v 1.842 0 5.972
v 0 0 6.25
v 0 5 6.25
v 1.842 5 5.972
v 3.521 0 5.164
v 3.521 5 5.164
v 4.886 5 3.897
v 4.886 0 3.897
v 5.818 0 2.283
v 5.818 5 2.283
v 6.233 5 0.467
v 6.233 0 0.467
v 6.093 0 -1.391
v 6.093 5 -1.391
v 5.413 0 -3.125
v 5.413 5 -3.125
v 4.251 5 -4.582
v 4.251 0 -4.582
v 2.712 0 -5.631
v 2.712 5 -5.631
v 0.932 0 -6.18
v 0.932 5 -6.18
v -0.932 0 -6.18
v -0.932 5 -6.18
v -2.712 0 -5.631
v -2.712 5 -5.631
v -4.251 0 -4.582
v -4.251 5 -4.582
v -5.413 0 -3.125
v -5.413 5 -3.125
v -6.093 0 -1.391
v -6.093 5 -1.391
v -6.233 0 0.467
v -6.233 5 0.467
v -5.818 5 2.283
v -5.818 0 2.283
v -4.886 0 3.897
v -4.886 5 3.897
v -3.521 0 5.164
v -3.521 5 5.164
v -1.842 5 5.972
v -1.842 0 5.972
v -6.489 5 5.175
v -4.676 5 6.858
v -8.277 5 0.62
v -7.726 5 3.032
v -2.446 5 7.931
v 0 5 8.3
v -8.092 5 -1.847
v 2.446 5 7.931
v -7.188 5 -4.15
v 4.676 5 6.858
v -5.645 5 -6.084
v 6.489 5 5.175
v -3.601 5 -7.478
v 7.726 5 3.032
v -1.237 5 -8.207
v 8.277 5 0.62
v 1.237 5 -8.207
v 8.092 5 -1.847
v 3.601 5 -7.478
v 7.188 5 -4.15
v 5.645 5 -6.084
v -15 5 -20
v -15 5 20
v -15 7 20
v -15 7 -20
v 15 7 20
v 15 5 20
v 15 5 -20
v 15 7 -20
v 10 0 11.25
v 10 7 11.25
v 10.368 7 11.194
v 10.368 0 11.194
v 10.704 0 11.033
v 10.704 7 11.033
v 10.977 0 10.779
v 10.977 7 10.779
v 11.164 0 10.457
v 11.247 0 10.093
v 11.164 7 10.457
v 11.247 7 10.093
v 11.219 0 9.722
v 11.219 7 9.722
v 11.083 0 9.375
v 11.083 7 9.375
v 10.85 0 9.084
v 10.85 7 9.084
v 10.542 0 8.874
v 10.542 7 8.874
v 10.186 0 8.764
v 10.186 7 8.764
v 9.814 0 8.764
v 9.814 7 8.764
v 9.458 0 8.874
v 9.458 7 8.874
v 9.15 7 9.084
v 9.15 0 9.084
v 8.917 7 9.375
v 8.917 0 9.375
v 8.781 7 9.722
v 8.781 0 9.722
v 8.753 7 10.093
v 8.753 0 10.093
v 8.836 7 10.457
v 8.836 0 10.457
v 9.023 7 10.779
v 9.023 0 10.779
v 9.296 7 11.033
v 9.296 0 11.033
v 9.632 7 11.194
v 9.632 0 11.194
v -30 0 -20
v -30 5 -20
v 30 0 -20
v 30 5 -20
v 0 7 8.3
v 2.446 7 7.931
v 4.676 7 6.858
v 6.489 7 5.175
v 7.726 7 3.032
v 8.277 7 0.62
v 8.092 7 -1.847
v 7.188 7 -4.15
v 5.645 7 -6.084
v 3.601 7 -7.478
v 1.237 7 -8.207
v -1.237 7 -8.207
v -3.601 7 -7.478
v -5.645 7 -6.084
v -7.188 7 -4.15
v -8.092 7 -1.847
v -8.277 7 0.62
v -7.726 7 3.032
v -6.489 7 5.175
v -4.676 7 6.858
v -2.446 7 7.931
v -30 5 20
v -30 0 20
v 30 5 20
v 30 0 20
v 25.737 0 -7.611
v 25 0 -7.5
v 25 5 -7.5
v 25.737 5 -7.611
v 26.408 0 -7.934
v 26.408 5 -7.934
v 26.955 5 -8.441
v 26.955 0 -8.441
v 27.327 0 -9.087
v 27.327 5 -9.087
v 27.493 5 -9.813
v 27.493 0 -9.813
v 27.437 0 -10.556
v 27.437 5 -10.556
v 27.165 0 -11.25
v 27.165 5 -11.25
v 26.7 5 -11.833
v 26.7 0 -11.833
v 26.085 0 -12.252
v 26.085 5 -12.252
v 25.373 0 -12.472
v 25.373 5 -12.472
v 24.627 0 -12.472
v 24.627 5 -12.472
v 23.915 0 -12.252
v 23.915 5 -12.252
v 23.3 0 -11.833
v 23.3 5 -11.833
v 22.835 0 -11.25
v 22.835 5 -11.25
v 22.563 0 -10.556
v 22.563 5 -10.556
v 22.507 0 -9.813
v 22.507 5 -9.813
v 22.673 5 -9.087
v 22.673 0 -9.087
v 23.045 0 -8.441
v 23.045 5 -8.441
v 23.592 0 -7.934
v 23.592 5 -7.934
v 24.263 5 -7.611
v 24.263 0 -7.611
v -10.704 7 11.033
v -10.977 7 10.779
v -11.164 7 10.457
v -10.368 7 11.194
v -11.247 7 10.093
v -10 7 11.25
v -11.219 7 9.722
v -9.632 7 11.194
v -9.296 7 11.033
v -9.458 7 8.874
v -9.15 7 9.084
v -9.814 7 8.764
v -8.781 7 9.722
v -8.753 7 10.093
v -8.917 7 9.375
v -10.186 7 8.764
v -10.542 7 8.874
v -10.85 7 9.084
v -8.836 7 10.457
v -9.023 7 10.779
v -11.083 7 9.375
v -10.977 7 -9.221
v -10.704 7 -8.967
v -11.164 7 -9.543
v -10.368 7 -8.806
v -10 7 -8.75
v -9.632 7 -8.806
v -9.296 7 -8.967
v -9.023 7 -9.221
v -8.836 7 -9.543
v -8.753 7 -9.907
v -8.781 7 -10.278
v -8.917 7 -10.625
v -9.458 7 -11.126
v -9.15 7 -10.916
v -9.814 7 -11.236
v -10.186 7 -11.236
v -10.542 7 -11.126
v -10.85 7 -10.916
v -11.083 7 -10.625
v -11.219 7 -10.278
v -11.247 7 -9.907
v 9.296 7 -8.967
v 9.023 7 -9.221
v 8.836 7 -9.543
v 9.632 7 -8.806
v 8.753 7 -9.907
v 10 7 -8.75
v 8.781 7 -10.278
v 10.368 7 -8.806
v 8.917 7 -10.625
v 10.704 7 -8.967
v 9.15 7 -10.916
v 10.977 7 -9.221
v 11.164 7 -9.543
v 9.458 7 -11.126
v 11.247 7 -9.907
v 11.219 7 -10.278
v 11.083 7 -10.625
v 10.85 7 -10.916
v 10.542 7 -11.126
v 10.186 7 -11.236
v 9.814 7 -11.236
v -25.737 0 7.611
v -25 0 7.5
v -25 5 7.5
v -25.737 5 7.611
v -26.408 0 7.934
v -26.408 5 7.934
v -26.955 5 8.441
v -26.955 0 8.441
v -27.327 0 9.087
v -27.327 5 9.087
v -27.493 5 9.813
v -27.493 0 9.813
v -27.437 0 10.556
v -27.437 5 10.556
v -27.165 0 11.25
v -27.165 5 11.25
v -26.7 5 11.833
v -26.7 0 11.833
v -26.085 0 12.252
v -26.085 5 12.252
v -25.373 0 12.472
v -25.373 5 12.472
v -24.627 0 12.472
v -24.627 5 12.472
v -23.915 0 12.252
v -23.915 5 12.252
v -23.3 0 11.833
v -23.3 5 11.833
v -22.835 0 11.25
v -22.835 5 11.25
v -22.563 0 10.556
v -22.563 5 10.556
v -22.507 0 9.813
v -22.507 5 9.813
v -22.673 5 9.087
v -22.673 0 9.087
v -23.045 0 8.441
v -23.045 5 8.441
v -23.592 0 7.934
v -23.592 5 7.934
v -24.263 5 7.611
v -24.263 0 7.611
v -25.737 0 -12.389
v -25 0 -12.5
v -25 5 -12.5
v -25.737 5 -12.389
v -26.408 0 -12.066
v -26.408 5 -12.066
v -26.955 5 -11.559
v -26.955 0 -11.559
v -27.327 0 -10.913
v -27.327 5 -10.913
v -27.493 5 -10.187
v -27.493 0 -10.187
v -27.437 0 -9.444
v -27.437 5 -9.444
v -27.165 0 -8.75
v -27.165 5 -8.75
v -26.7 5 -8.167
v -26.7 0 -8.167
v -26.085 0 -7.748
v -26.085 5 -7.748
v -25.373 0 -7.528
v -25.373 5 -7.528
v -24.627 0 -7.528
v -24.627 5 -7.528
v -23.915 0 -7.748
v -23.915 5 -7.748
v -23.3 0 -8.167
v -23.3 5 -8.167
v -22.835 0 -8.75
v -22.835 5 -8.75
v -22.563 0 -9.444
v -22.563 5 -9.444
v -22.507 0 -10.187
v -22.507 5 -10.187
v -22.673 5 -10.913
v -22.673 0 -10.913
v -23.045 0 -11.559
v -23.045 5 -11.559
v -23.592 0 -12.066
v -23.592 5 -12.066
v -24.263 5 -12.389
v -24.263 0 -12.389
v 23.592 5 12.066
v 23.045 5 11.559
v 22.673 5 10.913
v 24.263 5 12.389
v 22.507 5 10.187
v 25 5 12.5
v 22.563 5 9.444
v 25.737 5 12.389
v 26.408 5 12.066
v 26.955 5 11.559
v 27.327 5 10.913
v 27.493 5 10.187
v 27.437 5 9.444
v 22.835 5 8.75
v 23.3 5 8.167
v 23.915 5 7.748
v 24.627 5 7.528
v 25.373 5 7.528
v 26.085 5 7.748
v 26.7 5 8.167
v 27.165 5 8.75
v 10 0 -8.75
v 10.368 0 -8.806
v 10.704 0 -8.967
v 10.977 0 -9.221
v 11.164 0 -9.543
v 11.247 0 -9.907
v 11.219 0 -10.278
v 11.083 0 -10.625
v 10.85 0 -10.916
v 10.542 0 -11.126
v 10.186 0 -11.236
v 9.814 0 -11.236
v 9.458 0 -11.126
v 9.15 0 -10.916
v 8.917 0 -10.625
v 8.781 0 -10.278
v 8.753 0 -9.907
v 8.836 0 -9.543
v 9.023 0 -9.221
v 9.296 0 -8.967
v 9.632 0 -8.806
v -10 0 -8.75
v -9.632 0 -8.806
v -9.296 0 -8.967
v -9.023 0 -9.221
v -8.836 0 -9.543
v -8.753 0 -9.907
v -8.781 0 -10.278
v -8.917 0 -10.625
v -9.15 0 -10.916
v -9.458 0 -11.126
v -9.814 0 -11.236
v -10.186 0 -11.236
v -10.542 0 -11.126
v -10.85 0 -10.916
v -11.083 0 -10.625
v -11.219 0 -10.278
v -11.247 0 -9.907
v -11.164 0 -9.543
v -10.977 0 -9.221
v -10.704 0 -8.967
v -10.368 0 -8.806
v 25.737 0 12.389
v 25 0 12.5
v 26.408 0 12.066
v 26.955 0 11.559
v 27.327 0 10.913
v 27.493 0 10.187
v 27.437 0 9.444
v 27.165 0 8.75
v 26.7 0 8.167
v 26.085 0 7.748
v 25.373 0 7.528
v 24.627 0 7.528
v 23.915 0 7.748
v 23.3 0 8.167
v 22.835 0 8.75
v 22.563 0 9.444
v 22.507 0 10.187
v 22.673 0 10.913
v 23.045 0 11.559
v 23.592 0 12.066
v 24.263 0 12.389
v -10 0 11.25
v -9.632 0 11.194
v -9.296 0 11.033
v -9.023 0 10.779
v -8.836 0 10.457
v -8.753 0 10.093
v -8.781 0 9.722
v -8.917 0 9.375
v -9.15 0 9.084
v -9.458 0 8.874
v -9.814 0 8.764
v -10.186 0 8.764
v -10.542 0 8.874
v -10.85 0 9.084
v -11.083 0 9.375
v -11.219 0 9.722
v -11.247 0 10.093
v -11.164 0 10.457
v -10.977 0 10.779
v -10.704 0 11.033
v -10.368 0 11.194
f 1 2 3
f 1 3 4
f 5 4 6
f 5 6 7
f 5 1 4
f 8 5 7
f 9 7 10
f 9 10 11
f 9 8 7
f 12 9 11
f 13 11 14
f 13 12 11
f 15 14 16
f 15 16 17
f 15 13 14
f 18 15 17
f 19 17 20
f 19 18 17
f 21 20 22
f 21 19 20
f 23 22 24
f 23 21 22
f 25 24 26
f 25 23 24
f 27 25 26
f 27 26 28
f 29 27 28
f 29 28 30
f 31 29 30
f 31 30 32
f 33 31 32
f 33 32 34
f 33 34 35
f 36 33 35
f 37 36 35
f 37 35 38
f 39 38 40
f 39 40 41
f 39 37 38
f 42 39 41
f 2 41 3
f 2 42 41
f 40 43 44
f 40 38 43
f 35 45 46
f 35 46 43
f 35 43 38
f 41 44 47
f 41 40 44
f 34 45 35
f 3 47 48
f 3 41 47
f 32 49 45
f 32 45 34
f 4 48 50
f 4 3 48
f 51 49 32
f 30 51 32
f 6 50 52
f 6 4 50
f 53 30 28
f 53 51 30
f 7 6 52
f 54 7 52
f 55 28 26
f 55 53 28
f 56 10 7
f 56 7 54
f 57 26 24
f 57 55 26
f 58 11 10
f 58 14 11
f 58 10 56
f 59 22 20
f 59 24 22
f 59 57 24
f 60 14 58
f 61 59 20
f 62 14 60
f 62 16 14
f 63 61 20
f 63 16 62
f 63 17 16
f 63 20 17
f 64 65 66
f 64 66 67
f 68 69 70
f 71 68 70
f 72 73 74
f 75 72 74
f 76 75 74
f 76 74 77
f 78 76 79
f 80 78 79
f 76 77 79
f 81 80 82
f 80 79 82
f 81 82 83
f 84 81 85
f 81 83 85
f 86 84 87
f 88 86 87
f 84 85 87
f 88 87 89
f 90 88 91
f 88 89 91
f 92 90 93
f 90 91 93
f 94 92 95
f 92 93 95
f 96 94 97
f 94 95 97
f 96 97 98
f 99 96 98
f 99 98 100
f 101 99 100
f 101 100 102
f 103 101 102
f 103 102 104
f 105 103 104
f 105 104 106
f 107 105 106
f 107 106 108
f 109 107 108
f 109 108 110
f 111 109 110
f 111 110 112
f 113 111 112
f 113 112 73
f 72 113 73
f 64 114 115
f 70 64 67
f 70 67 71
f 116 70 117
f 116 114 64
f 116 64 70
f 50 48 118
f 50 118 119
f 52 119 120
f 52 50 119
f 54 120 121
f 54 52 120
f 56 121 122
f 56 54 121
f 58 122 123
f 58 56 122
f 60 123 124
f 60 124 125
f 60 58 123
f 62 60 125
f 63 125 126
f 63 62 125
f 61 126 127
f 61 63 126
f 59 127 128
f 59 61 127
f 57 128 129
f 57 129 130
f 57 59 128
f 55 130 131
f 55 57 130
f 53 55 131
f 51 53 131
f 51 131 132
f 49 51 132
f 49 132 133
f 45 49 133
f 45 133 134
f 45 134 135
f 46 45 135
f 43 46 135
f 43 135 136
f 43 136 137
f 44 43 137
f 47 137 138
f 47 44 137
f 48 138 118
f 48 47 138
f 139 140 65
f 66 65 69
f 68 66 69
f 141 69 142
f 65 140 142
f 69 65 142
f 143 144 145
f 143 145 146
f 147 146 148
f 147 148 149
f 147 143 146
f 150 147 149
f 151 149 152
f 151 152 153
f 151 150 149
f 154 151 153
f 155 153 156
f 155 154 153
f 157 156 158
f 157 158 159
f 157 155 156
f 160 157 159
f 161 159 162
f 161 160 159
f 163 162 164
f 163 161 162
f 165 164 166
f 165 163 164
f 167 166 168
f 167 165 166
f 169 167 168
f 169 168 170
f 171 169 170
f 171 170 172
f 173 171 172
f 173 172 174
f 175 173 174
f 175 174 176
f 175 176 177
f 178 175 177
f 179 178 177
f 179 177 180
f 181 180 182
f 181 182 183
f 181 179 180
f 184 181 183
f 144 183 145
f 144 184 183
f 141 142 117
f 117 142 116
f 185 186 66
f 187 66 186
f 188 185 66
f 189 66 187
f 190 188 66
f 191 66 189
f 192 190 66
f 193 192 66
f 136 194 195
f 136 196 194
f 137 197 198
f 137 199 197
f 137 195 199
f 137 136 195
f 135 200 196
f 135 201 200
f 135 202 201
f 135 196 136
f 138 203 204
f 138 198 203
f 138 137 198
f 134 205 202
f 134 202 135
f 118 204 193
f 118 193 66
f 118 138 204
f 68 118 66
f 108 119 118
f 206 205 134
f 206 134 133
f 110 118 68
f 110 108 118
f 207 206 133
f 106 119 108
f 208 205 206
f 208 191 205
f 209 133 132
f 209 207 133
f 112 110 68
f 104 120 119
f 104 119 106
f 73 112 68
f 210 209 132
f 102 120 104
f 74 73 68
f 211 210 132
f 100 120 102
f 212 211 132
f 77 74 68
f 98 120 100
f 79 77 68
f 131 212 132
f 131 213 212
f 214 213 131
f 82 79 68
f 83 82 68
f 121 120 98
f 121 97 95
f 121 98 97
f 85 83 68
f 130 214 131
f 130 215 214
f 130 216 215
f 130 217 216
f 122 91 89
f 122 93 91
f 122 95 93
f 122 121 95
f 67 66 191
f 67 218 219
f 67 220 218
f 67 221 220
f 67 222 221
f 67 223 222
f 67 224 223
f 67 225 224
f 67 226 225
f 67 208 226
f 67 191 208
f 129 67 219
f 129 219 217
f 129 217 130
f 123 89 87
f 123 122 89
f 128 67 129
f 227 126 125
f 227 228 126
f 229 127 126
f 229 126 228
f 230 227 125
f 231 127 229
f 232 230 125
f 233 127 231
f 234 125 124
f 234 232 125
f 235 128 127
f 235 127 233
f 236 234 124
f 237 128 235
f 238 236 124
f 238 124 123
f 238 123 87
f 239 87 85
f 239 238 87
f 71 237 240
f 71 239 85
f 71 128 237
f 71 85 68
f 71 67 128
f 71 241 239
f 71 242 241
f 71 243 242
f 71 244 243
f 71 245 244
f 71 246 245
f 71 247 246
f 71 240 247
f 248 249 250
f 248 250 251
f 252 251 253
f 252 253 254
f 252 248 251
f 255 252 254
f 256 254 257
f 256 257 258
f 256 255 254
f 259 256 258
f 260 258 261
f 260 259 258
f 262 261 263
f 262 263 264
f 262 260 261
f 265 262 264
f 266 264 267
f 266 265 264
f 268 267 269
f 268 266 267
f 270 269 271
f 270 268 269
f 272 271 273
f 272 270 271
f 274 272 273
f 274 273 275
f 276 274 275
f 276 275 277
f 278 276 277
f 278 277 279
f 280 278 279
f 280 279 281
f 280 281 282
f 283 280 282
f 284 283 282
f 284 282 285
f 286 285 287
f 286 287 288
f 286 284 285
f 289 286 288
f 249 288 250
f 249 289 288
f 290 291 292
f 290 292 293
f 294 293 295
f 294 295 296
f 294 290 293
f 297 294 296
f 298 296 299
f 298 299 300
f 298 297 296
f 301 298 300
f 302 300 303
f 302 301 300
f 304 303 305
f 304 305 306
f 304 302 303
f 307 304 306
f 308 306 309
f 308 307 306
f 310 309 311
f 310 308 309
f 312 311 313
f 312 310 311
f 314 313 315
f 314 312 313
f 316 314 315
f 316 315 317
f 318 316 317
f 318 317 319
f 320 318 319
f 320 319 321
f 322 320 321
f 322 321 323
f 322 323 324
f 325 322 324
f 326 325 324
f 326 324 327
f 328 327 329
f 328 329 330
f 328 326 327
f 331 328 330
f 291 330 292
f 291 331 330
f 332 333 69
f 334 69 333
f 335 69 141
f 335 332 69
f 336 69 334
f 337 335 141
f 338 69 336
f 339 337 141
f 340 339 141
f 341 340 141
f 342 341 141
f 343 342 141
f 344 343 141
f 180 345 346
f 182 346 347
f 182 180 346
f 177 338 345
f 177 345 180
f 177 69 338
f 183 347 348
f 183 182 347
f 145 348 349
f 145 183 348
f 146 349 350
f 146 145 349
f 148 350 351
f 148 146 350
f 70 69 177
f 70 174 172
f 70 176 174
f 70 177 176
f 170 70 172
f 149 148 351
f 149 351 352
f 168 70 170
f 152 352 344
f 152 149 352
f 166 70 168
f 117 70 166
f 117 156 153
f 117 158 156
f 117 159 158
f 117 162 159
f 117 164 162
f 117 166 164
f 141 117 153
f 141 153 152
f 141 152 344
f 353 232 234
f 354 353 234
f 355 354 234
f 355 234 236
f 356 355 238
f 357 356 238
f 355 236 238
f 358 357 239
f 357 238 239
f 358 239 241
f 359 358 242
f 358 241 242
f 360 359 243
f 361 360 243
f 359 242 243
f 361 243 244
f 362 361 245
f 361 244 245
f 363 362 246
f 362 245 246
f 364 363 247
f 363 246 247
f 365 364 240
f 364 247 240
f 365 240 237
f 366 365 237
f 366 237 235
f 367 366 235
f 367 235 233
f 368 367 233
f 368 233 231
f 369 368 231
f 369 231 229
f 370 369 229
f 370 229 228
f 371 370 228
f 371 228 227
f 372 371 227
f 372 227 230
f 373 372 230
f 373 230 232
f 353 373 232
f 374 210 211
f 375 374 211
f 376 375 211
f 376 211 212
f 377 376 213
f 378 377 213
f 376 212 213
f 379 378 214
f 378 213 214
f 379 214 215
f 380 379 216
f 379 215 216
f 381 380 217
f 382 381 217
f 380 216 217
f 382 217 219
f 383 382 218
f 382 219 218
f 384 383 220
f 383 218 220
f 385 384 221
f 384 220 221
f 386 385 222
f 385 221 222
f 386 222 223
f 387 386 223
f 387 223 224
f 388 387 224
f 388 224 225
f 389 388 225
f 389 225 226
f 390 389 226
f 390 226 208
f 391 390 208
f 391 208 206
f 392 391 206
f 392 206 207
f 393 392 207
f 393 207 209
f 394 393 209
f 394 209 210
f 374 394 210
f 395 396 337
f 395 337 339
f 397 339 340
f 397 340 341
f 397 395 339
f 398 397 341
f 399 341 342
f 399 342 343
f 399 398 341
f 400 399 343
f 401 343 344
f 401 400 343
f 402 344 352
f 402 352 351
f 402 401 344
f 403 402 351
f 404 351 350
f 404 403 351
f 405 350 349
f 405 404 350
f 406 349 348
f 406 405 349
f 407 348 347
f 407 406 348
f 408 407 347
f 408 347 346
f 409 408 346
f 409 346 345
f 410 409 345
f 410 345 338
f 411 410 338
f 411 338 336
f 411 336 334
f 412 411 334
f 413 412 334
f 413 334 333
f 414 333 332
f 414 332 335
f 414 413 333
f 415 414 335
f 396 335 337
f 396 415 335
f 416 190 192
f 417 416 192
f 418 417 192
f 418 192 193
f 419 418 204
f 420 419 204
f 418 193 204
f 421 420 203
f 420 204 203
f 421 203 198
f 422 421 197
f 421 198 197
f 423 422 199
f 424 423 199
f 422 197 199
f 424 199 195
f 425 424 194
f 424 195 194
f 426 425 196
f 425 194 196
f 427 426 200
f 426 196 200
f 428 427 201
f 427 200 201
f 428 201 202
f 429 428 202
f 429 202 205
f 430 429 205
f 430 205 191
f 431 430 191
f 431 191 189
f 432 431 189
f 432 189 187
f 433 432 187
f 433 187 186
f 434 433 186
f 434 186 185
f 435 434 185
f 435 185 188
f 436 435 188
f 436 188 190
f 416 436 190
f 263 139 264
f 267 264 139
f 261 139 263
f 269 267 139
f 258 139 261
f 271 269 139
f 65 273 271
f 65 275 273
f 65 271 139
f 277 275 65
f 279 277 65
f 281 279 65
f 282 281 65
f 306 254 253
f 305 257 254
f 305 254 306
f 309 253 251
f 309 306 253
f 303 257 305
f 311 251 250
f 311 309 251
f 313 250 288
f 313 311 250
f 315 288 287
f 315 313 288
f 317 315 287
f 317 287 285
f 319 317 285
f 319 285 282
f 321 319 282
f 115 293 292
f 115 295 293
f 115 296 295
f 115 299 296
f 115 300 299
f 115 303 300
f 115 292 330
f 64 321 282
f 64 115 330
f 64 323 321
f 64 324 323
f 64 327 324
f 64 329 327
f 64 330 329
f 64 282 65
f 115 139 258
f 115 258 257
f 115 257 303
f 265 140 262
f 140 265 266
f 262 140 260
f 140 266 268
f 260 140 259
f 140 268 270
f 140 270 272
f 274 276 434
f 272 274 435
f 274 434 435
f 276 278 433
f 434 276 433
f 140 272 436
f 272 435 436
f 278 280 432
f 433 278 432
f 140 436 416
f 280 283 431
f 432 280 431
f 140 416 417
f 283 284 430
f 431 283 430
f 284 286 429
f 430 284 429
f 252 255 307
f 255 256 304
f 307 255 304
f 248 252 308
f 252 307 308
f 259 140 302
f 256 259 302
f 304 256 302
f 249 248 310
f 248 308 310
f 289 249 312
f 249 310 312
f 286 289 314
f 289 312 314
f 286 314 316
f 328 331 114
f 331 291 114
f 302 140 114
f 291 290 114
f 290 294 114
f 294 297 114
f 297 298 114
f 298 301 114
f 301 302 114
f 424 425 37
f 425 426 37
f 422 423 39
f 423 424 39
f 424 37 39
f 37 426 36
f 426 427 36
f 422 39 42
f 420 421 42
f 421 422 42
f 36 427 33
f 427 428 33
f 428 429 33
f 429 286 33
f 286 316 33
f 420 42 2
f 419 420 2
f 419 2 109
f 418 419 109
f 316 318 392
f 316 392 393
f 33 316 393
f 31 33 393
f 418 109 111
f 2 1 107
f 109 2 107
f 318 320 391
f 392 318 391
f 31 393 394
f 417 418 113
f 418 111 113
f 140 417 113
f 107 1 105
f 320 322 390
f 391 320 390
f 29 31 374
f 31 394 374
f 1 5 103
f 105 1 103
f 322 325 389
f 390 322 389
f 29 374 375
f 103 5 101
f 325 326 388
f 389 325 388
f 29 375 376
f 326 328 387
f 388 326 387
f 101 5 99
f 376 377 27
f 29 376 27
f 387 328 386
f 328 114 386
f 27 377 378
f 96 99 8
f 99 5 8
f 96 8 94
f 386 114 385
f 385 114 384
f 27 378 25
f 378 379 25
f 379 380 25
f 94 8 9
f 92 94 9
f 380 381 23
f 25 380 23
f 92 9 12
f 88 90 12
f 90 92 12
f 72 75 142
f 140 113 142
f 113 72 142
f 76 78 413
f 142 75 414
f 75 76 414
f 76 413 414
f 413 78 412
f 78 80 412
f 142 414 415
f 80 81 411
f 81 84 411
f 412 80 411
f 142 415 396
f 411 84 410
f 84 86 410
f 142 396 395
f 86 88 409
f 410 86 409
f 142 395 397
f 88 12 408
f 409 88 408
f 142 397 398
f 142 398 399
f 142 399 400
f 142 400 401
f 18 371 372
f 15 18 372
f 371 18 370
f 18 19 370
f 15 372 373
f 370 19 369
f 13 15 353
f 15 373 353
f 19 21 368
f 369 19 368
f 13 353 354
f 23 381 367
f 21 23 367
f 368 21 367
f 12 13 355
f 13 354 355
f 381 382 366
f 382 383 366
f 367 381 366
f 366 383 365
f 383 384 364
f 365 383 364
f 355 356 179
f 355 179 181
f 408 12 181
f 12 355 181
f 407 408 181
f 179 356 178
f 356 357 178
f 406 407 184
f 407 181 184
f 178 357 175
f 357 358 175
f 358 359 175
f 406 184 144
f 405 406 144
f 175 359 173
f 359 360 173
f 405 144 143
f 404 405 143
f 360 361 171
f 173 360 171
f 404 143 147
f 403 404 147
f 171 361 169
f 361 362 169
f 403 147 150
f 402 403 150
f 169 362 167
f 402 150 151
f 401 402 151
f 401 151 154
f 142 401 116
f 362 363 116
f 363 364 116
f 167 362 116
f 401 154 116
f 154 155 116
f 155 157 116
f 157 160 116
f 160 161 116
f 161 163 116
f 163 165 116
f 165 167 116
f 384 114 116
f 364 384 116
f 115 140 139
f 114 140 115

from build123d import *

# Parameters (mm, degrees)
SKETCH1_W            = 60
SKETCH1_H            = 40
SKETCH1_R            = 2.5
SKETCH1_R_2          = 6.25
BODY_DEPTH           = 5
SKETCH3_W            = 30
SKETCH3_H            = 40
SKETCH3_R            = 8.3
BEARING_PLACE_DEPTH  = 2
SKETCH4_R            = 1.25
FIXATION_HOLES_DEPTH = 37.728735344


with BuildPart() as part:
    # Sketch1 → Body (new body)
    with BuildSketch(Plane(origin=(0, 0, 0), x_dir=(1, 0, 0), z_dir=(0, 1, 0))):
        Rectangle(SKETCH1_W, SKETCH1_H)
        with Locations(Location((25, 10, 0), (0, 0, 270))):
            Circle(SKETCH1_R, mode=Mode.SUBTRACT)
        with Locations(Location((25, -10, 0), (0, 0, 270))):
            Circle(SKETCH1_R, mode=Mode.SUBTRACT)
        with Locations(Location((0, 0, 0), (0, 0, 270))):
            Circle(SKETCH1_R_2, mode=Mode.SUBTRACT)
        with Locations(Location((-25, -10, 0), (0, 0, 90))):
            Circle(SKETCH1_R, mode=Mode.SUBTRACT)
        with Locations(Location((-25, 10, 0), (0, 0, 90))):
            Circle(SKETCH1_R, mode=Mode.SUBTRACT)
    extrude(amount=BODY_DEPTH)

    # Sketch3 → Bearing_Place (add)
    with BuildSketch(Plane(origin=(0, 5, 0), x_dir=(1, 0, 0), z_dir=(0, 1, 0))):
        Rectangle(SKETCH3_W, SKETCH3_H)
        with Locations(Location((0, 0, 0), (0, 0, 270))):
            Circle(SKETCH3_R, mode=Mode.SUBTRACT)
    extrude(amount=BEARING_PLACE_DEPTH)

    # Sketch4 → Fixation_Holes (cut, through all)
    with BuildSketch(Plane(origin=(0, 7, 0), x_dir=(1, 0, 0), z_dir=(0, 1, 0))):
        with Locations(Location((-10, 10, 0), (0, 0, 270))):
            Circle(SKETCH4_R)
        with Locations(Location((10, 10, 0), (0, 0, 270))):
            Circle(SKETCH4_R)
        with Locations(Location((10, -10, 0), (0, 0, 270))):
            Circle(SKETCH4_R)
        with Locations(Location((-10, -10, 0), (0, 0, 270))):
            Circle(SKETCH4_R)
    extrude(amount=-FIXATION_HOLES_DEPTH, mode=Mode.SUBTRACT)


solid = part.part
